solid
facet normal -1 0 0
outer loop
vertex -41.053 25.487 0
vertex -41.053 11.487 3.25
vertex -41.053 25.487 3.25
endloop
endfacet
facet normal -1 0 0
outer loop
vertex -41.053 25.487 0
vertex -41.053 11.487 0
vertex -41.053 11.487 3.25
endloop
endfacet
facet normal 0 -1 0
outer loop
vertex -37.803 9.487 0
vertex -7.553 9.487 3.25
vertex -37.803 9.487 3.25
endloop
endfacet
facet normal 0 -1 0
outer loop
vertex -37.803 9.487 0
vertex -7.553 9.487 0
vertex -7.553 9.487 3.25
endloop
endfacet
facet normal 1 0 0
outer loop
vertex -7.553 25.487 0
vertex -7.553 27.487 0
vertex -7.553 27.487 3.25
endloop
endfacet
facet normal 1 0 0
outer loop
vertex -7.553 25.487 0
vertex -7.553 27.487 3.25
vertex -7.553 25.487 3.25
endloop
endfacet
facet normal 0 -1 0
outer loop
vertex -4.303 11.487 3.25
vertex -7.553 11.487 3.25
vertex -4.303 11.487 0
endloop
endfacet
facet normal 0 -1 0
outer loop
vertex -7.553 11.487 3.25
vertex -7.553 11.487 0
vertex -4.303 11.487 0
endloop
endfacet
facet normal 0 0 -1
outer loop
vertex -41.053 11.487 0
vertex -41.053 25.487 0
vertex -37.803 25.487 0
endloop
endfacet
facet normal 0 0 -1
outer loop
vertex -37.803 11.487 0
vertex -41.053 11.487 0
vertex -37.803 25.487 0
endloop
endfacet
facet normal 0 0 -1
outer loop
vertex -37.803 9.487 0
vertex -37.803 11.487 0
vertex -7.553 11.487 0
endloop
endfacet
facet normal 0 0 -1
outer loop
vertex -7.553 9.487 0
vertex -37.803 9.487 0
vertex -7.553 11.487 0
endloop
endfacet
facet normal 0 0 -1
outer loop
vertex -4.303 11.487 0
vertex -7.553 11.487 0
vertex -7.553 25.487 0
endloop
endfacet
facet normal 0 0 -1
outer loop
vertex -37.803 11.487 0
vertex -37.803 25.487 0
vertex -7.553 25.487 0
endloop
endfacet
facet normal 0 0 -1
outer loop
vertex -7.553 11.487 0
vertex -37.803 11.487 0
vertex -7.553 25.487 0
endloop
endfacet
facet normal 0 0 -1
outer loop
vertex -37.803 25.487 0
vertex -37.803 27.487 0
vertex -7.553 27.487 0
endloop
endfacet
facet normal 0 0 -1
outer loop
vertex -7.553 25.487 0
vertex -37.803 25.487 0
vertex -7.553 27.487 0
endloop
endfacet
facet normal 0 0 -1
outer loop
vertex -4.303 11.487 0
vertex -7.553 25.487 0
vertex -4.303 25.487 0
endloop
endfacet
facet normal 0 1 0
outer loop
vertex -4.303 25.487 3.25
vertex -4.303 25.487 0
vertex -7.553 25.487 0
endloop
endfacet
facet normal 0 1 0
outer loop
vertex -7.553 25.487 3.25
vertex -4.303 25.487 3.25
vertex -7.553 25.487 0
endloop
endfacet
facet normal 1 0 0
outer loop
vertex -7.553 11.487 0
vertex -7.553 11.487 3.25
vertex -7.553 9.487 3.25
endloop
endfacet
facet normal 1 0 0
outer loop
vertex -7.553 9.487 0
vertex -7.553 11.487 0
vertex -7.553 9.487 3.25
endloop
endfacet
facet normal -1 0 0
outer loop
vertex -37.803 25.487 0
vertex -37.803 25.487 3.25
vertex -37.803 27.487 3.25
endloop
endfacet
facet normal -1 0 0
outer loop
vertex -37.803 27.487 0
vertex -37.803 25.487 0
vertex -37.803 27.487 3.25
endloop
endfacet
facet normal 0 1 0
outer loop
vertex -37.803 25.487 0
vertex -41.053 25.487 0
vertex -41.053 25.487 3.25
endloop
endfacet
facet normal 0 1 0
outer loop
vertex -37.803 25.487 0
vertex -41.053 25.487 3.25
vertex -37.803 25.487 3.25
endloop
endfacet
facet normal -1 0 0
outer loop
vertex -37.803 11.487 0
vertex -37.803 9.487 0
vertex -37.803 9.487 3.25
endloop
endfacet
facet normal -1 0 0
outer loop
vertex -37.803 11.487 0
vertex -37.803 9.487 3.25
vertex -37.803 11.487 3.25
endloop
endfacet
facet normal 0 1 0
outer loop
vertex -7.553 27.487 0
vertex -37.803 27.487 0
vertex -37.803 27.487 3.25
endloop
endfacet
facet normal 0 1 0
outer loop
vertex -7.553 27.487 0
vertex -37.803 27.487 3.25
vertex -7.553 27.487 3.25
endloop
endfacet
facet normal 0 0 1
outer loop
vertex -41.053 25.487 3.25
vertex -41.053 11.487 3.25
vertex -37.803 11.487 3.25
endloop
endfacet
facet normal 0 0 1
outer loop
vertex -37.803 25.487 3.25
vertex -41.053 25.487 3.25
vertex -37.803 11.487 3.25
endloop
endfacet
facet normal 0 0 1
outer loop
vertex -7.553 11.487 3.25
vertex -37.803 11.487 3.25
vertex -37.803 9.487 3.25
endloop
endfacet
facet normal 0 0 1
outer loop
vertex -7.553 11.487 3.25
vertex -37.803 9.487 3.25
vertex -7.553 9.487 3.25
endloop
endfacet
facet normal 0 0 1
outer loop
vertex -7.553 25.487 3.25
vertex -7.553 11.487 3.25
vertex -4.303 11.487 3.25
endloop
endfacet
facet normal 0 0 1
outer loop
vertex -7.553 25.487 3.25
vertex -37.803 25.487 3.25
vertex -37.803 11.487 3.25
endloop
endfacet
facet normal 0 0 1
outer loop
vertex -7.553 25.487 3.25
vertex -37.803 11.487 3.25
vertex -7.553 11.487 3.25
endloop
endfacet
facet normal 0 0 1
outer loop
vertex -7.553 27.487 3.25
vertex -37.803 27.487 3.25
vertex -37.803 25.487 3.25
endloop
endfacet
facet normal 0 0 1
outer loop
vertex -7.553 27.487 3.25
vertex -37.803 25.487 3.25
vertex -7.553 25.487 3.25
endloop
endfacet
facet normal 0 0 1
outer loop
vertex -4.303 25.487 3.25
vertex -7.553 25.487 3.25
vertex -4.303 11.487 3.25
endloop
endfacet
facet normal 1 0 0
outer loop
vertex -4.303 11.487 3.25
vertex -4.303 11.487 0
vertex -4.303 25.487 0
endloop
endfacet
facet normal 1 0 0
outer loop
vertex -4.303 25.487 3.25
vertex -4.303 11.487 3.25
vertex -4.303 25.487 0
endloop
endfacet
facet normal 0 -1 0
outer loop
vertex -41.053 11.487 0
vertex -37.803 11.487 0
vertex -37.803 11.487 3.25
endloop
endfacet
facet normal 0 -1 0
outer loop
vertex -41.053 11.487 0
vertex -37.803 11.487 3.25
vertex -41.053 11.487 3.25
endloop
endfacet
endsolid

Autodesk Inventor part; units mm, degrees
ref_plane "YZ Plane" through (0, 0, 0) normal (1, 0, 0) x (0, 1, 0)
ref_plane "XZ Plane" through (0, 0, 0) normal (0, 1, 0) x (-1, 0, 0)
ref_plane "XY Plane" through (0, 0, 0) normal (0, 0, 1) x (1, 0, 0)
sketch "Block1" plane through (0, 0, 0) normal (0, 0, 1) x (1, 0, 0)
  circle A0 centre (74.029, 24.2723) radius 1
  line L0 (49.279, 30.4723) -> (71.779, 30.4723)
  line L1 (71.779, 30.4723) -> (71.779, 18.0723)
  line L2 (71.779, 18.0723) -> (49.279, 18.0723)
  line L3 (49.279, 18.0723) -> (49.279, 30.4723)
  line L4 (49.279, 30.4723) -> (44.779, 30.4723)
  line L5 (44.779, 30.4723) -> (44.779, 18.0723)
  line L6 (44.779, 18.0723) -> (49.279, 18.0723)
  line L7 (49.279, 18.0723) -> (49.279, 30.4723)
  line L8 (71.779, 30.4723) -> (76.279, 30.4723)
  line L9 (76.279, 30.4723) -> (76.279, 18.0723)
  line L10 (76.279, 18.0723) -> (71.779, 18.0723)
  line L11 (71.779, 18.0723) -> (71.779, 30.4723)
  line L12 (44.779, 24.2723) -> (76.279, 24.2723) construction
  line L13 (47.029, 30.4723) -> (47.029, 18.0723) construction
  circle A1 centre (47.029, 24.2723) radius 1
  line L14 (74.029, 30.4723) -> (74.029, 18.0723) construction
  point P0 (60.979, 24.0984)
  dimension "d7" = 22.5
  dimension "d8" = 12.4
  dimension "d9" = 4.5
  dimension "d10" = 4.5
  dimension "d11" = 2
  dimension "d12" = 2
sketch "Sketch1" plane through (0, 0, 0) normal (0, 0, 1) x (1, 0, 0)
  line L0 (-92.7646, -8.503) -> (-89.7646, -8.503)
  line L1 (-89.7646, -8.503) -> (-89.7646, -11.753)
  line L2 (-89.7646, -11.753) -> (-92.7646, -11.753)
  line L3 (-92.7646, -11.753) -> (-92.7646, -8.503)
  line L4 (-92.7646, -21.6527) -> (-89.7646, -21.6527)
  line L5 (-89.7646, -21.6527) -> (-89.7646, -21.7527)
  line L6 (-89.7646, -21.7527) -> (-92.7646, -21.7527)
  line L7 (-92.7646, -21.7527) -> (-92.7646, -21.6527)
  line L8 (-37.803, 27.4868) -> (-7.553, 27.4868)
  line L9 (-7.553, 27.4868) -> (-7.553, 9.4868)
  line L10 (-7.553, 9.4868) -> (-37.803, 9.4868)
  line L11 (-37.803, 9.4868) -> (-37.803, 27.4868)
  line L12 (-41.053, 25.4868) -> (-37.803, 25.4868)
  line L13 (-37.803, 25.4868) -> (-37.803, 11.4868)
  line L14 (-37.803, 11.4868) -> (-41.053, 11.4868)
  line L15 (-41.053, 11.4868) -> (-41.053, 25.4868)
  line L16 (-37.803, 18.4868) -> (-7.553, 18.4868) construction
  line L17 (-22.678, 27.4868) -> (-22.678, 9.4868) construction
  line L18 (-41.053, 18.4868) -> (-37.803, 18.4868) construction
  line L19 (-4.303, 25.4868) -> (-7.553, 25.4868)
  line L20 (-7.553, 25.4868) -> (-7.553, 11.4868)
  line L21 (-7.553, 11.4868) -> (-4.303, 11.4868)
  line L22 (-4.303, 11.4868) -> (-4.303, 25.4868)
  line L23 (-4.303, 18.4868) -> (-7.553, 18.4868) construction
  point P0 (0, 0)
  point P1 (-7.553, 18.4868)
  dimension "d0" = 3
  dimension "mat" = 3.25
  dimension "d2" = 3
  dimension "d3" = 0.1
  dimension "d38" = 30.25
  dimension "d39" = 18
  dimension "d40" = 3.25
  dimension "d41" = 14
extrude "Extrusion5" add sketch "Sketch1" along normal blind 3.25 contours L8 L9 L10 L11 | L11 L14 L15 L12 | L19 L22 L21 L9
equation "\"d40\" = mat"
equation "\"d42\" = mat"
properties part number "arm-servo"
